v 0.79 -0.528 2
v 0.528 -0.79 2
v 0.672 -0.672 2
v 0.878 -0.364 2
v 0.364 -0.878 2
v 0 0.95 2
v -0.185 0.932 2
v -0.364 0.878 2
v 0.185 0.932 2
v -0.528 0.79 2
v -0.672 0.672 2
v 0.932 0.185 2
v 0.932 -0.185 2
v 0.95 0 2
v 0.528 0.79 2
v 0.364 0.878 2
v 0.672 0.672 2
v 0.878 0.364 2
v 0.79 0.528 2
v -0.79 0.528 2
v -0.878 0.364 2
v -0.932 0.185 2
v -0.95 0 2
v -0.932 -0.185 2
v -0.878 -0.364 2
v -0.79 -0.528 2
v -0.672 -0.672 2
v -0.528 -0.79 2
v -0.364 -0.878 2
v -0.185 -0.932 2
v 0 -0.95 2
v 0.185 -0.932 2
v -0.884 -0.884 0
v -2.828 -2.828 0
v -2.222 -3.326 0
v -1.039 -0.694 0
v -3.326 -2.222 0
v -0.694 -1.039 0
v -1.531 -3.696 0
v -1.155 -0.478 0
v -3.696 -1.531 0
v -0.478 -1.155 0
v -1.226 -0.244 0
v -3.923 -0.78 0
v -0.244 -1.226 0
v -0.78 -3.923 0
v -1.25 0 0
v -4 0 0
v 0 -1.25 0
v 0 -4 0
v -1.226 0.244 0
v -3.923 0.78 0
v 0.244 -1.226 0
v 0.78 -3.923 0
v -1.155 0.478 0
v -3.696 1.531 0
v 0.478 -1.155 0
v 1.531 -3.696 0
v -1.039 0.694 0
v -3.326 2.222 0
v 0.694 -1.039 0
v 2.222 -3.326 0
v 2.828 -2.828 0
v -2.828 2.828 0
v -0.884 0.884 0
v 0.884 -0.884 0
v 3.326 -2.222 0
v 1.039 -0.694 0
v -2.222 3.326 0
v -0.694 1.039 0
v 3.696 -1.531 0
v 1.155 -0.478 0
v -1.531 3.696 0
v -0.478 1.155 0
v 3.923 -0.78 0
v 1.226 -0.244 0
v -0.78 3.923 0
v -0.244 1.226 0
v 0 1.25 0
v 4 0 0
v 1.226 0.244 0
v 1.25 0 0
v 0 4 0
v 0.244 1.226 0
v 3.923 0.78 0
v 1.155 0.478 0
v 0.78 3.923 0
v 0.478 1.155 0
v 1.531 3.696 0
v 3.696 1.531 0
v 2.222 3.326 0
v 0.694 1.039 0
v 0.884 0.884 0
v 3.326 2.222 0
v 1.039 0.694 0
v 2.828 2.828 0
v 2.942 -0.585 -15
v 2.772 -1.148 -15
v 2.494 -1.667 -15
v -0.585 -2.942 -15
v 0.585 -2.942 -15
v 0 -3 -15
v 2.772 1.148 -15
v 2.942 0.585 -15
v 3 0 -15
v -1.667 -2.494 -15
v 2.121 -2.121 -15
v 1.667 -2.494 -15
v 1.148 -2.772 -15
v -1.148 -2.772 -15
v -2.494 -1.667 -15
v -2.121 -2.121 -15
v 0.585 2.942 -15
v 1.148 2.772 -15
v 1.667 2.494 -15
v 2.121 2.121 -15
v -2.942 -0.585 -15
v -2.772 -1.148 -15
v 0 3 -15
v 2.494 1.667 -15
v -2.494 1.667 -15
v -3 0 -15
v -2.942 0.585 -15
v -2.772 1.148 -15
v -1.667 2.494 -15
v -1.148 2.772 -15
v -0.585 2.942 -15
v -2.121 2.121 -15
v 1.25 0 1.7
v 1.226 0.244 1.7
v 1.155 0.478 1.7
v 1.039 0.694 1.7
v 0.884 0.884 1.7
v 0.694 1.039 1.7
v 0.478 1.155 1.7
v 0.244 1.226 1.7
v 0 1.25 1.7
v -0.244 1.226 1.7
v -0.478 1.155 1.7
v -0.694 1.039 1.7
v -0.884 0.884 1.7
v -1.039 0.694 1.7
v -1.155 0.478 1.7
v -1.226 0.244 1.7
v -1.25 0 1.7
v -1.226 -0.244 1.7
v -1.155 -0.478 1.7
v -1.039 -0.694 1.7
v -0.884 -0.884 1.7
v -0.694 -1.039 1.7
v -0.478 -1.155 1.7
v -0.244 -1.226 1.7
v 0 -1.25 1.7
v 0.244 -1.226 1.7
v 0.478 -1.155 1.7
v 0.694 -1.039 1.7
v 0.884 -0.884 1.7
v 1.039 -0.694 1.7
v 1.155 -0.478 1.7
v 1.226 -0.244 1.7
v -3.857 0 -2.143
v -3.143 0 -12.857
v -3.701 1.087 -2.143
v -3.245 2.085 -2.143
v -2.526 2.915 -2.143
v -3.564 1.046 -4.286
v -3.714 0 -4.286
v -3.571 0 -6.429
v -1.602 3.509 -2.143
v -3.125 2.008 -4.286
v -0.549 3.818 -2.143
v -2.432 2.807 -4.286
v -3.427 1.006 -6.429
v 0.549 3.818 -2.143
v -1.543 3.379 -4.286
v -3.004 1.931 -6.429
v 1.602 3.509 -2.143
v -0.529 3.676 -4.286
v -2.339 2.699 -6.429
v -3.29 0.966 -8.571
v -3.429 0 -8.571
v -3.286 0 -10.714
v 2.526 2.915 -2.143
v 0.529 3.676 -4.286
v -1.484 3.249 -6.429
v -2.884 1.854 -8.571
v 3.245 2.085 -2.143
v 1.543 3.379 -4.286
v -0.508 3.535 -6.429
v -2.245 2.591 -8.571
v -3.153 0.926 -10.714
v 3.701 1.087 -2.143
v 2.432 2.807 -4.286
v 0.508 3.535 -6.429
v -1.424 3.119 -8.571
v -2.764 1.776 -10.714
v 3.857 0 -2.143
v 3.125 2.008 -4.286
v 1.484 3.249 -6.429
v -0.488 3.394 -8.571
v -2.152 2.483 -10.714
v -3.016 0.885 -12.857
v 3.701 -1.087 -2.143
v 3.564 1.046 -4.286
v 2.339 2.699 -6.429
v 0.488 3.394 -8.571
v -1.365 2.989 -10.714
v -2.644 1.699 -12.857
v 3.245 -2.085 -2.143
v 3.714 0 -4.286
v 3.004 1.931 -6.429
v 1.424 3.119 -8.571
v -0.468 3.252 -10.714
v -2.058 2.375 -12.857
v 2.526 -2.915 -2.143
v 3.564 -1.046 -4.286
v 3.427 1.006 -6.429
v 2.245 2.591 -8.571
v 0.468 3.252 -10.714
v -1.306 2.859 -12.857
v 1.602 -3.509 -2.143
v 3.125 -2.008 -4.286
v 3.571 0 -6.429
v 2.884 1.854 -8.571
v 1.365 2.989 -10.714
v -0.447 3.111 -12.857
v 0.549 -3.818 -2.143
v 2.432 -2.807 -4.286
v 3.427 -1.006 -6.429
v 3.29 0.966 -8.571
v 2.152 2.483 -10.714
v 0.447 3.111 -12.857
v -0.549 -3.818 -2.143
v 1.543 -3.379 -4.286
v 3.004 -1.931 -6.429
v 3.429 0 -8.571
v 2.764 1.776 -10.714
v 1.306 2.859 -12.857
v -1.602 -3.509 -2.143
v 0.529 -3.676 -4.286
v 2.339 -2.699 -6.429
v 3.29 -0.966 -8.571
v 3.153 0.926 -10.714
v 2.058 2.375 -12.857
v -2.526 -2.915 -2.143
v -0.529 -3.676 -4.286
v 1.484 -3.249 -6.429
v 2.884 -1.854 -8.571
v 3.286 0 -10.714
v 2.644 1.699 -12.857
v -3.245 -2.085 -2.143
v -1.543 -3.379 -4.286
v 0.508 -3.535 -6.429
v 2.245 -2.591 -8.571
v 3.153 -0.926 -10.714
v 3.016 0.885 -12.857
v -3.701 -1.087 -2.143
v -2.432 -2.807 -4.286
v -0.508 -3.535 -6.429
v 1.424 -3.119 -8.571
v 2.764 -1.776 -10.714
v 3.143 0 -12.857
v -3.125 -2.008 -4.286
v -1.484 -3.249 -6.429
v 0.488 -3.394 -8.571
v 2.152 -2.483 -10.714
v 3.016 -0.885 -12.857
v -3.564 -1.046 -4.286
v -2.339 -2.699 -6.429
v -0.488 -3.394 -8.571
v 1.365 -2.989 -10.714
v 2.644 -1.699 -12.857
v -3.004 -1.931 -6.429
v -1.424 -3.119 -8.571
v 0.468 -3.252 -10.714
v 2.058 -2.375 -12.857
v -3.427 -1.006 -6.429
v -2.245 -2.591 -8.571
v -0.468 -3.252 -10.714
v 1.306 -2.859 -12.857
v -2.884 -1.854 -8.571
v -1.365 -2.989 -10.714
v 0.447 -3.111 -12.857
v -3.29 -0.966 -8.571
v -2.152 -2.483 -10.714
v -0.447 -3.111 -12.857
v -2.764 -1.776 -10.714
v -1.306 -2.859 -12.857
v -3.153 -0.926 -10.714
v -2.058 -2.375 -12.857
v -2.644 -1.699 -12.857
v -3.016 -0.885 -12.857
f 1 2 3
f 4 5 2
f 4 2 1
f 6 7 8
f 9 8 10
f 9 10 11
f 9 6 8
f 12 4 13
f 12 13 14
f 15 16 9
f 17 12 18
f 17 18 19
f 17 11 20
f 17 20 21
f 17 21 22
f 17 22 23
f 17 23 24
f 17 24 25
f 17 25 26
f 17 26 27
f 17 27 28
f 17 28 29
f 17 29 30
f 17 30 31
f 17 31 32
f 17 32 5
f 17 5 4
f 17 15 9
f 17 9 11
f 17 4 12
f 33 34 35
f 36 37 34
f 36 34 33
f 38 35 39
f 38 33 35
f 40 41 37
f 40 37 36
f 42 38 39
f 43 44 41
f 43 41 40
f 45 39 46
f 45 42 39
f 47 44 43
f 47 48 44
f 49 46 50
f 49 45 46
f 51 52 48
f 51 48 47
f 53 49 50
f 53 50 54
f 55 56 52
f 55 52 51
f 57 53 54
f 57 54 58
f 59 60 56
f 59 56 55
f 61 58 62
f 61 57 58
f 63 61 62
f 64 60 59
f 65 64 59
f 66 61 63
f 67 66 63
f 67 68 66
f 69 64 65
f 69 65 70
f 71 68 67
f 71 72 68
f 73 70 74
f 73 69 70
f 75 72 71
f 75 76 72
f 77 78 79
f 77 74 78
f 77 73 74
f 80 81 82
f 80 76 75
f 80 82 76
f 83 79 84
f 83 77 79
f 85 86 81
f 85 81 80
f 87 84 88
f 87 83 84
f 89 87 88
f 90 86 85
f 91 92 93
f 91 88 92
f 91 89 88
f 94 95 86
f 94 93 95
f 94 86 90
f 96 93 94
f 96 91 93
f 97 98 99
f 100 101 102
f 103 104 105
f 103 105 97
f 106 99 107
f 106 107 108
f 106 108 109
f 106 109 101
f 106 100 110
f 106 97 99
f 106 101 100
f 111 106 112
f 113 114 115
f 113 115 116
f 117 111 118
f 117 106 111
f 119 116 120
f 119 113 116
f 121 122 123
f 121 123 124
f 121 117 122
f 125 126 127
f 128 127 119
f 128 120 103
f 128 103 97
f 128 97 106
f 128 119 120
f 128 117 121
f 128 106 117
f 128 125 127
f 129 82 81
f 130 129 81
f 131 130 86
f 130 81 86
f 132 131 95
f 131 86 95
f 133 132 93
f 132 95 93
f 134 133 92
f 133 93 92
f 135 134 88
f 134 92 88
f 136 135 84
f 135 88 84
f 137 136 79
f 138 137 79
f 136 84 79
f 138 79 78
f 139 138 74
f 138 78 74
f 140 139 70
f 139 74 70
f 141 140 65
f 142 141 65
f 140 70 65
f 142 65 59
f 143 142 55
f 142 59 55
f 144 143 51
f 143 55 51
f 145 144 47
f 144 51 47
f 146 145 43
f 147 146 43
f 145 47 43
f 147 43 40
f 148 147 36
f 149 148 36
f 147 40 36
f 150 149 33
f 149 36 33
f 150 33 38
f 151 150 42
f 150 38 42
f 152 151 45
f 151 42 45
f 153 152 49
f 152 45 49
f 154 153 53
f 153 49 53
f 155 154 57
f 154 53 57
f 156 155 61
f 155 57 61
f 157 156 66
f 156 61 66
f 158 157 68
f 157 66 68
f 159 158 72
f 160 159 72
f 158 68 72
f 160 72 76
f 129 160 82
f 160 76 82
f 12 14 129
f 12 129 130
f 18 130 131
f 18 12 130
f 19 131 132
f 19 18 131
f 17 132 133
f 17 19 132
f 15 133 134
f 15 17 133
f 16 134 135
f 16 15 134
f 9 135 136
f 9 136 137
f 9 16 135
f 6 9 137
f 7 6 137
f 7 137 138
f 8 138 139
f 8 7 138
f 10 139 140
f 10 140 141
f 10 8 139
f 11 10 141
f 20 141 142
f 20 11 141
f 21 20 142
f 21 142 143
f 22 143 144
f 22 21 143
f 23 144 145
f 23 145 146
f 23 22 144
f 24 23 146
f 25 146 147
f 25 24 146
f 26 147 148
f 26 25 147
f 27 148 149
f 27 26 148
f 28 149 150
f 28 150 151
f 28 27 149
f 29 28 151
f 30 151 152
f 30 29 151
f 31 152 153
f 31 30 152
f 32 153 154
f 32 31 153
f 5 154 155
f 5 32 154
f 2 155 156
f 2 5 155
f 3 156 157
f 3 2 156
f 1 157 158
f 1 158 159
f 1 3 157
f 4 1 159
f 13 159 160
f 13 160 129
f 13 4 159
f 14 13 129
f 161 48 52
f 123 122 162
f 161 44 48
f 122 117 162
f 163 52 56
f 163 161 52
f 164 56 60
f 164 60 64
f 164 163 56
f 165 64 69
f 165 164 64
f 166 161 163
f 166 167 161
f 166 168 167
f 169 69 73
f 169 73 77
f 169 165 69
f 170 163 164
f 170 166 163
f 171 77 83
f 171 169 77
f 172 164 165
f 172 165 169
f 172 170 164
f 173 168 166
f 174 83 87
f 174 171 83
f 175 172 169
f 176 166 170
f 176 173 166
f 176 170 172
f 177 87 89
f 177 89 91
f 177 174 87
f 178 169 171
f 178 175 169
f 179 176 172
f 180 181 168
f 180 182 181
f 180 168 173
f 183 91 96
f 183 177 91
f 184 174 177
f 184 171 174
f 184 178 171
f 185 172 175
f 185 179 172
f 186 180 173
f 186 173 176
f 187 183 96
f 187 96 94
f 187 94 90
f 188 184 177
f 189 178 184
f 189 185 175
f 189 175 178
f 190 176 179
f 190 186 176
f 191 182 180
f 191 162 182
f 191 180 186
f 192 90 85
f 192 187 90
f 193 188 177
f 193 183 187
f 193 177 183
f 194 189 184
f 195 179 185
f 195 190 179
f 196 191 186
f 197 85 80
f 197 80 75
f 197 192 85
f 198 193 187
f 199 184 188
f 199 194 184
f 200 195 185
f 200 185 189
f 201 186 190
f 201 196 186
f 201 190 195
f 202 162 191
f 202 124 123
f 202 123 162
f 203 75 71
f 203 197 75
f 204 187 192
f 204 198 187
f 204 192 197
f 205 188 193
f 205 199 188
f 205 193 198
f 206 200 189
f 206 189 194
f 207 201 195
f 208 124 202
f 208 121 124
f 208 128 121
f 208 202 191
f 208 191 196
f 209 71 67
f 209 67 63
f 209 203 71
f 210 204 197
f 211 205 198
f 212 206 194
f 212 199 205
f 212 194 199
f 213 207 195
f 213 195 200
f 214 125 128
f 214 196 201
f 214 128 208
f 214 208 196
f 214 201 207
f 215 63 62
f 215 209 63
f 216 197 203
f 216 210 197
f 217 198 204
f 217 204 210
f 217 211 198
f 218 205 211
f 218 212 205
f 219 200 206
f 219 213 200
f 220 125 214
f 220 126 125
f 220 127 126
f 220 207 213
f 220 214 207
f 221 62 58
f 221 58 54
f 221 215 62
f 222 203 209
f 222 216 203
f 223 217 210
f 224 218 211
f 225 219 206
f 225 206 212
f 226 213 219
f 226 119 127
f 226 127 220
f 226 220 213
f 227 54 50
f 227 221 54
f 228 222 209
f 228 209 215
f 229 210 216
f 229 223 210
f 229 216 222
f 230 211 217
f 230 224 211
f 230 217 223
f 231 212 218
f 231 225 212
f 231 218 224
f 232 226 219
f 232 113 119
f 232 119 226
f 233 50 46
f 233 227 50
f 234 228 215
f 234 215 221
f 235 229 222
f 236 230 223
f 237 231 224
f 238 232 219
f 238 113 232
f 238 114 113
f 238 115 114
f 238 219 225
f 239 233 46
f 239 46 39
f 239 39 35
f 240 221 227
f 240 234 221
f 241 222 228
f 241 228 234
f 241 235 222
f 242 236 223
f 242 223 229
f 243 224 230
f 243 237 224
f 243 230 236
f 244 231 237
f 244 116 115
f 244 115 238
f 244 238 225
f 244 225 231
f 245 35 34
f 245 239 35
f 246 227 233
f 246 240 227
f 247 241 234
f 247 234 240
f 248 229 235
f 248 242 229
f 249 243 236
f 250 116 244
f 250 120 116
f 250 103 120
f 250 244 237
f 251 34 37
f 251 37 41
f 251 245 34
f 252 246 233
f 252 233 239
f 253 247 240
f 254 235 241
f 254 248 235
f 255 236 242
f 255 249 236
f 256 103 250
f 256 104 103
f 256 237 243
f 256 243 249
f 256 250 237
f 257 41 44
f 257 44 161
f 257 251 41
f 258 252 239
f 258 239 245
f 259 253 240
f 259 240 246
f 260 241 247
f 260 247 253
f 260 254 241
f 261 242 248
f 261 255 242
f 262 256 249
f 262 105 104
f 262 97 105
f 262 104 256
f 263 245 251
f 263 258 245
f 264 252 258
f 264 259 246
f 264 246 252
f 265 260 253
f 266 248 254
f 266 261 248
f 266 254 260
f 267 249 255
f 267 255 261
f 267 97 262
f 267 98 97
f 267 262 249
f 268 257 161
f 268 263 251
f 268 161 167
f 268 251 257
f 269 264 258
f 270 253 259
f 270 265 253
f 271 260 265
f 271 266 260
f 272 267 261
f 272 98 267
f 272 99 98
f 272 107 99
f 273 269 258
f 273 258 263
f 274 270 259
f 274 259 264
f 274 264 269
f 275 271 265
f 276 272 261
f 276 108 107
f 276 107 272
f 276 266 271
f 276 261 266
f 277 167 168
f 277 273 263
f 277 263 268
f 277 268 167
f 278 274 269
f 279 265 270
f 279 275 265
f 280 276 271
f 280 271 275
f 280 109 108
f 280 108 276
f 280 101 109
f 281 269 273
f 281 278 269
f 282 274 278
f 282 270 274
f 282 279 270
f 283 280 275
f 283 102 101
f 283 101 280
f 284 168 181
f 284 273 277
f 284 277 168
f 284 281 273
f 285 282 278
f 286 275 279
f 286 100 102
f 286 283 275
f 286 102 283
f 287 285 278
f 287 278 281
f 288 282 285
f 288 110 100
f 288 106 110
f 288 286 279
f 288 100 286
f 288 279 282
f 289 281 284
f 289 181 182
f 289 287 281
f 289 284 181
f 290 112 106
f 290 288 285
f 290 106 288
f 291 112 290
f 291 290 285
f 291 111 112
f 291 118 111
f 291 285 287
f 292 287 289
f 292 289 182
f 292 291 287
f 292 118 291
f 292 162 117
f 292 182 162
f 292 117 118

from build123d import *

# Parameters (mm, degrees)
F2_R     = 1.25
F3_DEPTH = 2
F4_SIZE  = 0.3


with BuildPart() as f1:
    # F0 (on Front) → F1 (revolve)
    with BuildSketch(Plane.XZ):
        Polygon((0, -15), (0, 0), (-4, 0), (-3, -15), align=None)
    revolve(axis=Axis((0, 0, -6.756781), (0, 0, -1)))

    # F2 (on face) → F3 (join)
    with BuildSketch(Plane.XY):
        Circle(F2_R)
    extrude(amount=F3_DEPTH)

    # F4
    f4_edges = [f1.edges().sort_by_distance(p)[0] for p in [
        (-1.25, 0, 2),
    ]]
    chamfer(f4_edges, length=F4_SIZE)


solid = f1.part
